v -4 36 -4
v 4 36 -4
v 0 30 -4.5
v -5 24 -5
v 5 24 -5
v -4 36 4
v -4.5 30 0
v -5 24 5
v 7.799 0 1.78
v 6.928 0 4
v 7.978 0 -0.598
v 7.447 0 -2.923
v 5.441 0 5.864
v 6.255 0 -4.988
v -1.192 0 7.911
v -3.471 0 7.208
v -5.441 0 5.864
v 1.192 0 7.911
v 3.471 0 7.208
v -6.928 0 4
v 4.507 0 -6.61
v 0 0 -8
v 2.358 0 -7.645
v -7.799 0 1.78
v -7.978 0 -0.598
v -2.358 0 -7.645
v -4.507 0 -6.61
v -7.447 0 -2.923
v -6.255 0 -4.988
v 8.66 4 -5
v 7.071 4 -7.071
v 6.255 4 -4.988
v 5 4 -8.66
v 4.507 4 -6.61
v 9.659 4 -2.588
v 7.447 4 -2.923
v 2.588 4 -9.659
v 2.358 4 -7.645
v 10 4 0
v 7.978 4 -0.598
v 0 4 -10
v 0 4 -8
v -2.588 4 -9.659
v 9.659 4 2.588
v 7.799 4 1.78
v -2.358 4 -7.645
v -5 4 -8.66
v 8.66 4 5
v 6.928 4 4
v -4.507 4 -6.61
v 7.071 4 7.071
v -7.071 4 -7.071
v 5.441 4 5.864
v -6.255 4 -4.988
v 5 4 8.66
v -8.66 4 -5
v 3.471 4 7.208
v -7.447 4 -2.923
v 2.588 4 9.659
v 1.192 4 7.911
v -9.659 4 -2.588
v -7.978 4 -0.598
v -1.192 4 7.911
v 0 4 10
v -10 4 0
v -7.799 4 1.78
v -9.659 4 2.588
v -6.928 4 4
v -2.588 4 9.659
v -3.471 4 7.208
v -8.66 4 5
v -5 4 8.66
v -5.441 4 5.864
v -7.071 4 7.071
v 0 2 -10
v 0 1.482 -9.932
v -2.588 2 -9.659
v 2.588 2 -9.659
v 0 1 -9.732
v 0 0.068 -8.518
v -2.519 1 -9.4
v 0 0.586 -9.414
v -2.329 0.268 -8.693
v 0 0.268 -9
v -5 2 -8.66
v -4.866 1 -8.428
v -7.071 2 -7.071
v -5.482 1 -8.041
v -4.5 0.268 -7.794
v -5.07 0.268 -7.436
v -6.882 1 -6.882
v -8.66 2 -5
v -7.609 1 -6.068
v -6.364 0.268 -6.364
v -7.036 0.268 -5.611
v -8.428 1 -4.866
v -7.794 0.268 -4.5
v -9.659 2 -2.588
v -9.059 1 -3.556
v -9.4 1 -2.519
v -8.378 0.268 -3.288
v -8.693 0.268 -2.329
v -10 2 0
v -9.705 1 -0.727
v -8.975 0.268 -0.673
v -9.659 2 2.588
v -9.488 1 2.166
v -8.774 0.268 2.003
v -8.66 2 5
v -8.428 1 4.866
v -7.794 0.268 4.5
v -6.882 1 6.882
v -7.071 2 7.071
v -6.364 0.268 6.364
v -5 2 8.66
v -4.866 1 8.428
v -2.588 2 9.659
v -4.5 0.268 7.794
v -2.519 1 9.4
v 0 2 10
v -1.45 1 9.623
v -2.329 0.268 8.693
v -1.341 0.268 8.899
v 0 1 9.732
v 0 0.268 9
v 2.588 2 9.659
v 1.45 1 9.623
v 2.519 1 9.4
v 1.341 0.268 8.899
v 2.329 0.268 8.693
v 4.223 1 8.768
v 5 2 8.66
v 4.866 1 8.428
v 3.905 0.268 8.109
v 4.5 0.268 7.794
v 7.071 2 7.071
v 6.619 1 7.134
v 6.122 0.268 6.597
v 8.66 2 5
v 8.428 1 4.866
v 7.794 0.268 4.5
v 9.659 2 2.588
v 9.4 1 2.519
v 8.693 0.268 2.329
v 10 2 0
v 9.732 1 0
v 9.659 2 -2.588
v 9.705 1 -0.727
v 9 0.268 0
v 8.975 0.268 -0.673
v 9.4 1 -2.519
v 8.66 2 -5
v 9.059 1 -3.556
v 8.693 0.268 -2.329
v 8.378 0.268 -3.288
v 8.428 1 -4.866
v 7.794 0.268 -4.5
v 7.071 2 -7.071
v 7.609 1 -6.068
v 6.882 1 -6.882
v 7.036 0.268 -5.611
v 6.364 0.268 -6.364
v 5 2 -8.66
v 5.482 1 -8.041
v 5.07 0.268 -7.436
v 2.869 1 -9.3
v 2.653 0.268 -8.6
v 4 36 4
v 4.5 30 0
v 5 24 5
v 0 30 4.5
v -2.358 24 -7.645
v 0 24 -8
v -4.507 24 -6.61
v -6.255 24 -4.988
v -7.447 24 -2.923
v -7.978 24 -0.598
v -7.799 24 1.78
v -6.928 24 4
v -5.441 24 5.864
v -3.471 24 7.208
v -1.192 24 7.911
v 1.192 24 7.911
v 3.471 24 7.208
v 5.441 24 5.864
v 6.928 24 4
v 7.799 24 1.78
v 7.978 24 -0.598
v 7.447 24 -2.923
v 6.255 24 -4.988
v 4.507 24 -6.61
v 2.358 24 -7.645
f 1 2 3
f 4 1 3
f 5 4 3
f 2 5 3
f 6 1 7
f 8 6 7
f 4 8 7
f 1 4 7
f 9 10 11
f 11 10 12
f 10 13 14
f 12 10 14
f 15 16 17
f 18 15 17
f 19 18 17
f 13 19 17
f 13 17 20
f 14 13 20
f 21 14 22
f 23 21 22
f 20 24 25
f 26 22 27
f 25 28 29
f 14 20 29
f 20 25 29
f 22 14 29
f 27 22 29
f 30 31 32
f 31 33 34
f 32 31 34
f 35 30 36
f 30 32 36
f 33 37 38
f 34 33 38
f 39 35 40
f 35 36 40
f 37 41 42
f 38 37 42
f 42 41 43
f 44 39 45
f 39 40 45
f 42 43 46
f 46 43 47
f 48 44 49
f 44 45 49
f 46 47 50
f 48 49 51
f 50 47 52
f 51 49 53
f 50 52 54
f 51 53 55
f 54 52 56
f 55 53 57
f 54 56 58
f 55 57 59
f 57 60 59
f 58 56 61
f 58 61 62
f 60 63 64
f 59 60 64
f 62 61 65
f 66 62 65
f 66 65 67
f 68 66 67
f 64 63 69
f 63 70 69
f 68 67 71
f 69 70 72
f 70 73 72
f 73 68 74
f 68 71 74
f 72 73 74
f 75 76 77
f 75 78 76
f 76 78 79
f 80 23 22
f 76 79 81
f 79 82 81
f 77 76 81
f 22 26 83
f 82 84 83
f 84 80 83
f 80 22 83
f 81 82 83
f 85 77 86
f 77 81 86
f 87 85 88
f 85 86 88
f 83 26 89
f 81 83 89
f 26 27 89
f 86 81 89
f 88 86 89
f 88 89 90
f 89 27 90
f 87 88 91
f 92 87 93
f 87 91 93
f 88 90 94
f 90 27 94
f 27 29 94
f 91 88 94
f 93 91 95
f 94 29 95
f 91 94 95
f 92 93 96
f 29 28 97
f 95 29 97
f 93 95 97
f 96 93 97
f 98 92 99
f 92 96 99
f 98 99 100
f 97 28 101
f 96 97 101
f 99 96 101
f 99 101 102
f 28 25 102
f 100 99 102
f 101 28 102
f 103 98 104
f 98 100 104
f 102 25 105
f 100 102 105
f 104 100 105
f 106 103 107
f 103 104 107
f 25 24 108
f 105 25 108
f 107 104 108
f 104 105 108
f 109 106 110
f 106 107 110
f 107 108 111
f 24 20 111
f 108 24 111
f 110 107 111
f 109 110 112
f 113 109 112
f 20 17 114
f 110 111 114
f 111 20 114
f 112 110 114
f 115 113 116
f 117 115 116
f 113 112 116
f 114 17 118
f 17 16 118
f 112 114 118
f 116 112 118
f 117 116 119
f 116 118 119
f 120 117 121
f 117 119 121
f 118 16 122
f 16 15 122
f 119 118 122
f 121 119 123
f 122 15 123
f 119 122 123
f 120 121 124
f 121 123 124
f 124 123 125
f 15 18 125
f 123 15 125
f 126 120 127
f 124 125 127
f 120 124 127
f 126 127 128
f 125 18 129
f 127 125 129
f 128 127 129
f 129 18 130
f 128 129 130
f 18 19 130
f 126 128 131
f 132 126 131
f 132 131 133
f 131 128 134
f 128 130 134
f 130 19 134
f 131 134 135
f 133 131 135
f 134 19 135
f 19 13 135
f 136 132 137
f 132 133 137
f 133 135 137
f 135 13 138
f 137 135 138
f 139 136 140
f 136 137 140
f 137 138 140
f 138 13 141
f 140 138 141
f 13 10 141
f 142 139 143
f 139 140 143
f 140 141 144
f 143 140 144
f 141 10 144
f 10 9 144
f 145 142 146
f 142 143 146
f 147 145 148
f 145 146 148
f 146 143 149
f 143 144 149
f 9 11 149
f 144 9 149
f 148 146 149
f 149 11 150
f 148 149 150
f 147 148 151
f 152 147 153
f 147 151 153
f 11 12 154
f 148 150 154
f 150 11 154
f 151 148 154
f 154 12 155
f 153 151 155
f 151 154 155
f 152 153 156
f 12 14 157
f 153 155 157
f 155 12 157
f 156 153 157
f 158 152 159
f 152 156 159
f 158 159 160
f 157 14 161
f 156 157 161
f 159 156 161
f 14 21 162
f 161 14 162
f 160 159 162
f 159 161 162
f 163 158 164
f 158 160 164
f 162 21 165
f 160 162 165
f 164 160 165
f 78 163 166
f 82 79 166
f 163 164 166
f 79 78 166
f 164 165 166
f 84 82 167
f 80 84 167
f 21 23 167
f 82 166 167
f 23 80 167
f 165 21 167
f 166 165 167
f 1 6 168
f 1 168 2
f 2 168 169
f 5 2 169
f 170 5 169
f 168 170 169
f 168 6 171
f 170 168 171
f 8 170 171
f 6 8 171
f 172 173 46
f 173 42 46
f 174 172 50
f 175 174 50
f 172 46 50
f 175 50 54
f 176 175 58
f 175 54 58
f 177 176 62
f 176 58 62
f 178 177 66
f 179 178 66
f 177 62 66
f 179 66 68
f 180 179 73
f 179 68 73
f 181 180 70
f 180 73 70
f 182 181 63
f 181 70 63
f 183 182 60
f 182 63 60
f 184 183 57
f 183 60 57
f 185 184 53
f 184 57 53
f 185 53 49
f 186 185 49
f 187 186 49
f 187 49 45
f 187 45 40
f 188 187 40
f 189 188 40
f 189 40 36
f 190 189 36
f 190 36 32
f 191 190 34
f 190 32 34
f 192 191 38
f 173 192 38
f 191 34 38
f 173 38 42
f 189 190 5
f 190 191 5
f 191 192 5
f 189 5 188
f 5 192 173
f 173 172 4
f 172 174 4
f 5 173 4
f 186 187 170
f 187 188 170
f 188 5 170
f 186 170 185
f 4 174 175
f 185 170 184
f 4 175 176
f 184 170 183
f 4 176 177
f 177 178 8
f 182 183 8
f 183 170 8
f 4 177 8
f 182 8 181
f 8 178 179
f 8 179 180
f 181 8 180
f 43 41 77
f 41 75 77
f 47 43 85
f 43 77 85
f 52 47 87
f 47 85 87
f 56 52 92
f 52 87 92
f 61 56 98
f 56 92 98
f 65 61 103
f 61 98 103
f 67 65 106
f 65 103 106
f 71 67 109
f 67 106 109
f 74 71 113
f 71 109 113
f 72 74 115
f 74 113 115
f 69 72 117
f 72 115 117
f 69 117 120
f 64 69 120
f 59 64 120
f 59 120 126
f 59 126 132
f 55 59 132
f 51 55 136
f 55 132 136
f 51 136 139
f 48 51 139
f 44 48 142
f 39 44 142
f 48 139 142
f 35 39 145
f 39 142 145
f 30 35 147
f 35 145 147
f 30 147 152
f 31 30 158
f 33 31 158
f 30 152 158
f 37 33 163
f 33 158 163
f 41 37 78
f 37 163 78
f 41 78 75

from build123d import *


with BuildPart() as part:
    # Sketch1 → Revolve1 (revolve)
    with BuildSketch(Plane.XY, mode=Mode.PRIVATE) as revolve1_sk:
        with BuildLine():
            Line((0, 0), (0, 24))
            Line((0, 24), (8, 24))
            Line((8, 24), (8, 4))
            Line((8, 4), (10, 4))
            Line((10, 4), (10, 2))
            ThreePointArc((10, 2), (9.414213562, 0.585786438), (8, 0))
            Line((8, 0), (0, 0))
        make_face()
    revolve(revolve1_sk.sketch.rotate(Axis((0, 0, 0), (0, 1, 0)), 90), axis=Axis((0, 0, 0), (0, 1, 0)))

    # Sketch3 → Loft1 section 0
    with BuildSketch(Plane(origin=(0, 36, 0), x_dir=(1, 0, 0), z_dir=(0, 1, 0))):
        with BuildLine():
            Line((-4, -4), (4, -4))
            Line((4, -4), (4, 4))
            Line((4, 4), (-4, 4))
            Line((-4, 4), (-4, -4))
        make_face()
    # Sketch2 → Loft1 section 1
    with BuildSketch(Plane(origin=(0, 24, 0), x_dir=(1, 0, 0), z_dir=(0, 1, 0))):
        with BuildLine():
            Line((-5, -5), (5, -5))
            Line((5, -5), (5, 5))
            Line((5, 5), (-5, 5))
            Line((-5, 5), (-5, -5))
        make_face()
    loft()


solid = part.part
